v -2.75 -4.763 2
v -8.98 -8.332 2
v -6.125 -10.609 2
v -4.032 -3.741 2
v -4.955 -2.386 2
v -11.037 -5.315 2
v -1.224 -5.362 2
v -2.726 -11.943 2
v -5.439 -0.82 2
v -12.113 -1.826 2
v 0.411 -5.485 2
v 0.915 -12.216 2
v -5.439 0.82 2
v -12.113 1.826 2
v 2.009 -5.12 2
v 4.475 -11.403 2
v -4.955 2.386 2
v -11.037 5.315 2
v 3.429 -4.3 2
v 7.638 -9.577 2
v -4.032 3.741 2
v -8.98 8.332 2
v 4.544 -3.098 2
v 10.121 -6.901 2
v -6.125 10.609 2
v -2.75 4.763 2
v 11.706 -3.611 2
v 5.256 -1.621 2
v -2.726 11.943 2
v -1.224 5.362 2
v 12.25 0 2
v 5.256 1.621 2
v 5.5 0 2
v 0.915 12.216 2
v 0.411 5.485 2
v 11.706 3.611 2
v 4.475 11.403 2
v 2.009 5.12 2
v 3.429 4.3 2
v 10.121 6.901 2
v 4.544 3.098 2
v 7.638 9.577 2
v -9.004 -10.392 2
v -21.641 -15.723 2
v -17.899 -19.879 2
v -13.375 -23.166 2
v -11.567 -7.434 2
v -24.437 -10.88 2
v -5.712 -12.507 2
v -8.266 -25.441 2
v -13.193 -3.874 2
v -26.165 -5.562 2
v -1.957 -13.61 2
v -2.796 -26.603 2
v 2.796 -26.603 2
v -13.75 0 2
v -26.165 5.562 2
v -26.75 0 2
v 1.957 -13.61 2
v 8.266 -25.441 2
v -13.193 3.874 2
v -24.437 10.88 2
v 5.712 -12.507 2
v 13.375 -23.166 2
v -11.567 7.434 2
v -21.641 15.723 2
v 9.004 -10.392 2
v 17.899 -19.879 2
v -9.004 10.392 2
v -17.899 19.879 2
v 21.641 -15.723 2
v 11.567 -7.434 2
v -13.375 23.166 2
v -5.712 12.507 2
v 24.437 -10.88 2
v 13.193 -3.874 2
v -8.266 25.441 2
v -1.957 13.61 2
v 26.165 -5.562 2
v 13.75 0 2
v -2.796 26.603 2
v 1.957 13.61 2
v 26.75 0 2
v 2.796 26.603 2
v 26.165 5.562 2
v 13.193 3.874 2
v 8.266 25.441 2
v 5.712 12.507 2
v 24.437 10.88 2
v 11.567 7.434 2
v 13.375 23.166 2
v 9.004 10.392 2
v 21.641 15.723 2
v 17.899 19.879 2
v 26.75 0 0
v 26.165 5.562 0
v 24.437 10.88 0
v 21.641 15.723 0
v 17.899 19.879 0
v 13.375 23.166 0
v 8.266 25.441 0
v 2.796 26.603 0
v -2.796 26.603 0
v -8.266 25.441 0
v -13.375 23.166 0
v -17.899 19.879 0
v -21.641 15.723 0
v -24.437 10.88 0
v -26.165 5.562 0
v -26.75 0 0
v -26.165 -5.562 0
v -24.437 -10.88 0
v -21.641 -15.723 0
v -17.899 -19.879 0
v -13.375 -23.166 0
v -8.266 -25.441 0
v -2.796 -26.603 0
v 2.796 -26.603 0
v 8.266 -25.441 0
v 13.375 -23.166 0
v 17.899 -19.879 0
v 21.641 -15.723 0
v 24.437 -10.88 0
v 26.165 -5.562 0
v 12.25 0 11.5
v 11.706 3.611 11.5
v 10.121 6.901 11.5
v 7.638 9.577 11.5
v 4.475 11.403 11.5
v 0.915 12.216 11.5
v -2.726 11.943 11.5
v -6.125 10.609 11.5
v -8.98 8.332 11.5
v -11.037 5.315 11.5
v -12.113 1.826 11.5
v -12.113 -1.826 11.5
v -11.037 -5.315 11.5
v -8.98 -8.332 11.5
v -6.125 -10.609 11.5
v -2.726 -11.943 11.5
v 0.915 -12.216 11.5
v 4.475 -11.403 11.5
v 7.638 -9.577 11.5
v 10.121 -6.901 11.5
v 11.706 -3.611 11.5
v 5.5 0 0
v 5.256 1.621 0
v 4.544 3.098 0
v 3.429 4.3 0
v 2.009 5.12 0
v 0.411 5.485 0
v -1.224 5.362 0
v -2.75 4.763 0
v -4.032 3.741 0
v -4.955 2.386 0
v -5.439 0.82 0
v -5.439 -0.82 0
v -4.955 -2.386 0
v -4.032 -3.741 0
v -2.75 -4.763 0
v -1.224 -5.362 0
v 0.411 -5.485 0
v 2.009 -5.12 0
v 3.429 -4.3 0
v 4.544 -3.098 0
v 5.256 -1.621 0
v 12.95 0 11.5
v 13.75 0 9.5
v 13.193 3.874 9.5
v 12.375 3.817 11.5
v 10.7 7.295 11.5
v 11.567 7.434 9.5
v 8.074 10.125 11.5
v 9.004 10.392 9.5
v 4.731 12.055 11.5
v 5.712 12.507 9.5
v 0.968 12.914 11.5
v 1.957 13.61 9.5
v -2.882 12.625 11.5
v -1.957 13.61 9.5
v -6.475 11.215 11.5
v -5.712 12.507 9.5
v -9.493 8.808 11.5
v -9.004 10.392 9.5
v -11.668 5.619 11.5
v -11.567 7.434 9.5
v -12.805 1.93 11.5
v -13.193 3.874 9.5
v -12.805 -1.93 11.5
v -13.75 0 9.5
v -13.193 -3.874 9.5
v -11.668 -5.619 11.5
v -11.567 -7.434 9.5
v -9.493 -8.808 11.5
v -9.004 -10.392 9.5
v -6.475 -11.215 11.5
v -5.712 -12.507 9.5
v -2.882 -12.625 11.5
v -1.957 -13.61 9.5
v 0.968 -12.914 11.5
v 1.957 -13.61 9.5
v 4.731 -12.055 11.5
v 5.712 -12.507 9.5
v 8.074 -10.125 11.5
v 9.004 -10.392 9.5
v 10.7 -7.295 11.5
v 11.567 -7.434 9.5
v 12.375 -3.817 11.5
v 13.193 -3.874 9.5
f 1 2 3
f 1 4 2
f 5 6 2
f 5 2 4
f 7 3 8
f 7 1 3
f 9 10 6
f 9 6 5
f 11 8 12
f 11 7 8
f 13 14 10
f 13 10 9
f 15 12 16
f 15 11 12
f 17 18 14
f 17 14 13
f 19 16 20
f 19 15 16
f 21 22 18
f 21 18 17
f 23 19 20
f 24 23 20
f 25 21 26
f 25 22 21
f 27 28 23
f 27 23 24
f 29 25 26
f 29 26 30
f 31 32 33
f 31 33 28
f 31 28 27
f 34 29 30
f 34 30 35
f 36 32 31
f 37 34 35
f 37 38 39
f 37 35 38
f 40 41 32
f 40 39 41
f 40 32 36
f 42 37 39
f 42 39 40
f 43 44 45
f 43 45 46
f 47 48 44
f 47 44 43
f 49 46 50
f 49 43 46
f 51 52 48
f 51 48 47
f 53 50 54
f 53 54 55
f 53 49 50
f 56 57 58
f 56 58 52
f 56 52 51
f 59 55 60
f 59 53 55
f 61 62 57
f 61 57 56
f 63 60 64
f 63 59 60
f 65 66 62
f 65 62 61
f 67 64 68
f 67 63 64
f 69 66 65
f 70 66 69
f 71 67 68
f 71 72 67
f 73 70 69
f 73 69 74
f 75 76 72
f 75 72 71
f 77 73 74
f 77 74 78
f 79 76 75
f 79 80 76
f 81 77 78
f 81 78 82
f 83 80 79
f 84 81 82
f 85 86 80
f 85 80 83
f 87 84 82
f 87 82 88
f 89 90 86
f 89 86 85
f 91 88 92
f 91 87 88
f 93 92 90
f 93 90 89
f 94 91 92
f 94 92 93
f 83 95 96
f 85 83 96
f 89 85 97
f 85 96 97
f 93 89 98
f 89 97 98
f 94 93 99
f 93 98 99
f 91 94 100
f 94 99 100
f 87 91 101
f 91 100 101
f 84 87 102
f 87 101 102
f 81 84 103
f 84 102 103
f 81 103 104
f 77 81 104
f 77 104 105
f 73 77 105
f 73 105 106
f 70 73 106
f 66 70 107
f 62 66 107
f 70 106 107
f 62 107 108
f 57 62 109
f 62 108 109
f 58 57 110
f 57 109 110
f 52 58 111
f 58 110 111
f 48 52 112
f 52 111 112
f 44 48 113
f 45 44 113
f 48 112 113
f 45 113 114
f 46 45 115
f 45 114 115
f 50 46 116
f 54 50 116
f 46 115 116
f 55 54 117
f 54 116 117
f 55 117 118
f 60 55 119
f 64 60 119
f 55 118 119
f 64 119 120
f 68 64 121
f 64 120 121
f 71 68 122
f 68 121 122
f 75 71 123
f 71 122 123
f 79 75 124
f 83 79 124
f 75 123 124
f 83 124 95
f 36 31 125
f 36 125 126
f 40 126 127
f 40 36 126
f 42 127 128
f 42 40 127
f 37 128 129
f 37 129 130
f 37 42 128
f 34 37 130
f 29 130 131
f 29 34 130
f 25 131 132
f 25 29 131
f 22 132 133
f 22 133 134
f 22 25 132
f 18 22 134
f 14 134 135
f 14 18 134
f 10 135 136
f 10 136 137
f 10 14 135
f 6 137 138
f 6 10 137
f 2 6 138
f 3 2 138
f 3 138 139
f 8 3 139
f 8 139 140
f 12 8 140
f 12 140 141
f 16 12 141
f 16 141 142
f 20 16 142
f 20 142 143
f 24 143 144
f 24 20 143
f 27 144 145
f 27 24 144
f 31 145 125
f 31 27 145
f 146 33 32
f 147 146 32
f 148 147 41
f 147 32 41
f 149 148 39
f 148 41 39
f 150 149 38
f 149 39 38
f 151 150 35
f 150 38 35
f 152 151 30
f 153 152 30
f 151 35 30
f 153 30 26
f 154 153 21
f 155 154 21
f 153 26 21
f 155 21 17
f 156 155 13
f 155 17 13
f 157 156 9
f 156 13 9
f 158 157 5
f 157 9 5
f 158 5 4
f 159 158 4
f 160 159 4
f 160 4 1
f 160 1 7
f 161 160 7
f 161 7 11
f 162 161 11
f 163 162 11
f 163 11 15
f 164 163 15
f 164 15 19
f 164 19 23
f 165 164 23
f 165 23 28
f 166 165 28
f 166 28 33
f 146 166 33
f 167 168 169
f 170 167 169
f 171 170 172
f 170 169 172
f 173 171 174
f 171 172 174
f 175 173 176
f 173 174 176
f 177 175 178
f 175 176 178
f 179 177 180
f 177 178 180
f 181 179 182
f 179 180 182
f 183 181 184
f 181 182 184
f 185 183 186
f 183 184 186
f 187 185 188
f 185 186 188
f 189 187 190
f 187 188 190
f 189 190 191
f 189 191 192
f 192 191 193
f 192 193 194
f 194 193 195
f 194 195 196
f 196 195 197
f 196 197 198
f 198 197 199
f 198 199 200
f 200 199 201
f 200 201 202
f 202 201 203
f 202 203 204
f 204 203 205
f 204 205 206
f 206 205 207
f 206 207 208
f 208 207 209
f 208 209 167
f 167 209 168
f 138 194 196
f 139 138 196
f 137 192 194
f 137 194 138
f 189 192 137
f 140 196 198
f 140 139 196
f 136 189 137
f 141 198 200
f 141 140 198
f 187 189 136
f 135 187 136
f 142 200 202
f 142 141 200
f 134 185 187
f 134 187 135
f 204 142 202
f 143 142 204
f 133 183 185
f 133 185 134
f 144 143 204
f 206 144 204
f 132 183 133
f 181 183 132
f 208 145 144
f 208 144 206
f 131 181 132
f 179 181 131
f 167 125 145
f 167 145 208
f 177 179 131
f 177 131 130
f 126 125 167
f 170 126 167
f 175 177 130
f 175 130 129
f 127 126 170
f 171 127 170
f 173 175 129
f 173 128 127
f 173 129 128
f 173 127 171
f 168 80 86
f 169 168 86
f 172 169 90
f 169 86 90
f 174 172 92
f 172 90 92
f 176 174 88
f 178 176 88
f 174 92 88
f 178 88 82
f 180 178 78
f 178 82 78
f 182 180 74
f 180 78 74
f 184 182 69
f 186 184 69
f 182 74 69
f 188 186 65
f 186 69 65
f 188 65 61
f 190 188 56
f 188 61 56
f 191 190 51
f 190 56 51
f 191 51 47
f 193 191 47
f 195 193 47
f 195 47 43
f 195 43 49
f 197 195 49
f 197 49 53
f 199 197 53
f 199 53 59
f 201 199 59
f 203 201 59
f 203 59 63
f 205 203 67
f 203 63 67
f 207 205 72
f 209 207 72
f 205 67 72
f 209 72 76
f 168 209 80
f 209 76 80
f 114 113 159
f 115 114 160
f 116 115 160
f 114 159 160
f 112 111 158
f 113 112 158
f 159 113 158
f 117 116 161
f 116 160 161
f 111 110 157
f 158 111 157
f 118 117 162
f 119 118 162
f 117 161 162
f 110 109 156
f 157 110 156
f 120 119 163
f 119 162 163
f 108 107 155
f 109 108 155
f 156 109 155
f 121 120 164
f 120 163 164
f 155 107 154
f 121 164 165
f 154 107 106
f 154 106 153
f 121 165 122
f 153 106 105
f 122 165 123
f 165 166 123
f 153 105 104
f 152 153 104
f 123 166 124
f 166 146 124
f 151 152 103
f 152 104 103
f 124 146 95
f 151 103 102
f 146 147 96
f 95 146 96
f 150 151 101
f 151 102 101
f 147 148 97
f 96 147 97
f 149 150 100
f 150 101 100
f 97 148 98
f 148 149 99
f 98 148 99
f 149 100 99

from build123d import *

# Parameters (mm, degrees)
F0_R     = 26.75
F1_DEPTH = 2
F2_R     = 13.75
F2_R_2   = 12.25
F3_DEPTH = 9.5
F4_SIZE2 = 2
F4_SIZE  = 0.8
F5_R     = 5.5
F6_DEPTH = 25


# Not quite as in the source:
# - a feature of the source that left no trace in its solid (it failed there, or was rolled back) is left out


with BuildPart() as f1:
    # F0 (on Top) → F1 (new body)
    with BuildSketch(Plane.XY):
        Circle(F0_R)
    extrude(amount=F1_DEPTH)

    # F2 (on face) → F3 (join)
    with BuildSketch(Plane.XY.offset(2)):
        Circle(F2_R)
        Circle(F2_R_2, mode=Mode.SUBTRACT)
    extrude(amount=F3_DEPTH)

    # F4
    f4_edges = [f1.edges().sort_by_distance(p)[0] for p in [
        (-13.75, 0, 11.5),
    ]]
    f4_side = f1.faces().sort_by_distance((-13.361091, 0, 11.5))[0]
    chamfer(f4_edges, length=F4_SIZE, length2=F4_SIZE2, reference=f4_side)

    # F5 (on face) → F6 (cut)
    with BuildSketch(Plane.XY.offset(2)):
        Circle(F5_R)
    extrude(amount=-F6_DEPTH, mode=Mode.SUBTRACT)


solid = f1.part
